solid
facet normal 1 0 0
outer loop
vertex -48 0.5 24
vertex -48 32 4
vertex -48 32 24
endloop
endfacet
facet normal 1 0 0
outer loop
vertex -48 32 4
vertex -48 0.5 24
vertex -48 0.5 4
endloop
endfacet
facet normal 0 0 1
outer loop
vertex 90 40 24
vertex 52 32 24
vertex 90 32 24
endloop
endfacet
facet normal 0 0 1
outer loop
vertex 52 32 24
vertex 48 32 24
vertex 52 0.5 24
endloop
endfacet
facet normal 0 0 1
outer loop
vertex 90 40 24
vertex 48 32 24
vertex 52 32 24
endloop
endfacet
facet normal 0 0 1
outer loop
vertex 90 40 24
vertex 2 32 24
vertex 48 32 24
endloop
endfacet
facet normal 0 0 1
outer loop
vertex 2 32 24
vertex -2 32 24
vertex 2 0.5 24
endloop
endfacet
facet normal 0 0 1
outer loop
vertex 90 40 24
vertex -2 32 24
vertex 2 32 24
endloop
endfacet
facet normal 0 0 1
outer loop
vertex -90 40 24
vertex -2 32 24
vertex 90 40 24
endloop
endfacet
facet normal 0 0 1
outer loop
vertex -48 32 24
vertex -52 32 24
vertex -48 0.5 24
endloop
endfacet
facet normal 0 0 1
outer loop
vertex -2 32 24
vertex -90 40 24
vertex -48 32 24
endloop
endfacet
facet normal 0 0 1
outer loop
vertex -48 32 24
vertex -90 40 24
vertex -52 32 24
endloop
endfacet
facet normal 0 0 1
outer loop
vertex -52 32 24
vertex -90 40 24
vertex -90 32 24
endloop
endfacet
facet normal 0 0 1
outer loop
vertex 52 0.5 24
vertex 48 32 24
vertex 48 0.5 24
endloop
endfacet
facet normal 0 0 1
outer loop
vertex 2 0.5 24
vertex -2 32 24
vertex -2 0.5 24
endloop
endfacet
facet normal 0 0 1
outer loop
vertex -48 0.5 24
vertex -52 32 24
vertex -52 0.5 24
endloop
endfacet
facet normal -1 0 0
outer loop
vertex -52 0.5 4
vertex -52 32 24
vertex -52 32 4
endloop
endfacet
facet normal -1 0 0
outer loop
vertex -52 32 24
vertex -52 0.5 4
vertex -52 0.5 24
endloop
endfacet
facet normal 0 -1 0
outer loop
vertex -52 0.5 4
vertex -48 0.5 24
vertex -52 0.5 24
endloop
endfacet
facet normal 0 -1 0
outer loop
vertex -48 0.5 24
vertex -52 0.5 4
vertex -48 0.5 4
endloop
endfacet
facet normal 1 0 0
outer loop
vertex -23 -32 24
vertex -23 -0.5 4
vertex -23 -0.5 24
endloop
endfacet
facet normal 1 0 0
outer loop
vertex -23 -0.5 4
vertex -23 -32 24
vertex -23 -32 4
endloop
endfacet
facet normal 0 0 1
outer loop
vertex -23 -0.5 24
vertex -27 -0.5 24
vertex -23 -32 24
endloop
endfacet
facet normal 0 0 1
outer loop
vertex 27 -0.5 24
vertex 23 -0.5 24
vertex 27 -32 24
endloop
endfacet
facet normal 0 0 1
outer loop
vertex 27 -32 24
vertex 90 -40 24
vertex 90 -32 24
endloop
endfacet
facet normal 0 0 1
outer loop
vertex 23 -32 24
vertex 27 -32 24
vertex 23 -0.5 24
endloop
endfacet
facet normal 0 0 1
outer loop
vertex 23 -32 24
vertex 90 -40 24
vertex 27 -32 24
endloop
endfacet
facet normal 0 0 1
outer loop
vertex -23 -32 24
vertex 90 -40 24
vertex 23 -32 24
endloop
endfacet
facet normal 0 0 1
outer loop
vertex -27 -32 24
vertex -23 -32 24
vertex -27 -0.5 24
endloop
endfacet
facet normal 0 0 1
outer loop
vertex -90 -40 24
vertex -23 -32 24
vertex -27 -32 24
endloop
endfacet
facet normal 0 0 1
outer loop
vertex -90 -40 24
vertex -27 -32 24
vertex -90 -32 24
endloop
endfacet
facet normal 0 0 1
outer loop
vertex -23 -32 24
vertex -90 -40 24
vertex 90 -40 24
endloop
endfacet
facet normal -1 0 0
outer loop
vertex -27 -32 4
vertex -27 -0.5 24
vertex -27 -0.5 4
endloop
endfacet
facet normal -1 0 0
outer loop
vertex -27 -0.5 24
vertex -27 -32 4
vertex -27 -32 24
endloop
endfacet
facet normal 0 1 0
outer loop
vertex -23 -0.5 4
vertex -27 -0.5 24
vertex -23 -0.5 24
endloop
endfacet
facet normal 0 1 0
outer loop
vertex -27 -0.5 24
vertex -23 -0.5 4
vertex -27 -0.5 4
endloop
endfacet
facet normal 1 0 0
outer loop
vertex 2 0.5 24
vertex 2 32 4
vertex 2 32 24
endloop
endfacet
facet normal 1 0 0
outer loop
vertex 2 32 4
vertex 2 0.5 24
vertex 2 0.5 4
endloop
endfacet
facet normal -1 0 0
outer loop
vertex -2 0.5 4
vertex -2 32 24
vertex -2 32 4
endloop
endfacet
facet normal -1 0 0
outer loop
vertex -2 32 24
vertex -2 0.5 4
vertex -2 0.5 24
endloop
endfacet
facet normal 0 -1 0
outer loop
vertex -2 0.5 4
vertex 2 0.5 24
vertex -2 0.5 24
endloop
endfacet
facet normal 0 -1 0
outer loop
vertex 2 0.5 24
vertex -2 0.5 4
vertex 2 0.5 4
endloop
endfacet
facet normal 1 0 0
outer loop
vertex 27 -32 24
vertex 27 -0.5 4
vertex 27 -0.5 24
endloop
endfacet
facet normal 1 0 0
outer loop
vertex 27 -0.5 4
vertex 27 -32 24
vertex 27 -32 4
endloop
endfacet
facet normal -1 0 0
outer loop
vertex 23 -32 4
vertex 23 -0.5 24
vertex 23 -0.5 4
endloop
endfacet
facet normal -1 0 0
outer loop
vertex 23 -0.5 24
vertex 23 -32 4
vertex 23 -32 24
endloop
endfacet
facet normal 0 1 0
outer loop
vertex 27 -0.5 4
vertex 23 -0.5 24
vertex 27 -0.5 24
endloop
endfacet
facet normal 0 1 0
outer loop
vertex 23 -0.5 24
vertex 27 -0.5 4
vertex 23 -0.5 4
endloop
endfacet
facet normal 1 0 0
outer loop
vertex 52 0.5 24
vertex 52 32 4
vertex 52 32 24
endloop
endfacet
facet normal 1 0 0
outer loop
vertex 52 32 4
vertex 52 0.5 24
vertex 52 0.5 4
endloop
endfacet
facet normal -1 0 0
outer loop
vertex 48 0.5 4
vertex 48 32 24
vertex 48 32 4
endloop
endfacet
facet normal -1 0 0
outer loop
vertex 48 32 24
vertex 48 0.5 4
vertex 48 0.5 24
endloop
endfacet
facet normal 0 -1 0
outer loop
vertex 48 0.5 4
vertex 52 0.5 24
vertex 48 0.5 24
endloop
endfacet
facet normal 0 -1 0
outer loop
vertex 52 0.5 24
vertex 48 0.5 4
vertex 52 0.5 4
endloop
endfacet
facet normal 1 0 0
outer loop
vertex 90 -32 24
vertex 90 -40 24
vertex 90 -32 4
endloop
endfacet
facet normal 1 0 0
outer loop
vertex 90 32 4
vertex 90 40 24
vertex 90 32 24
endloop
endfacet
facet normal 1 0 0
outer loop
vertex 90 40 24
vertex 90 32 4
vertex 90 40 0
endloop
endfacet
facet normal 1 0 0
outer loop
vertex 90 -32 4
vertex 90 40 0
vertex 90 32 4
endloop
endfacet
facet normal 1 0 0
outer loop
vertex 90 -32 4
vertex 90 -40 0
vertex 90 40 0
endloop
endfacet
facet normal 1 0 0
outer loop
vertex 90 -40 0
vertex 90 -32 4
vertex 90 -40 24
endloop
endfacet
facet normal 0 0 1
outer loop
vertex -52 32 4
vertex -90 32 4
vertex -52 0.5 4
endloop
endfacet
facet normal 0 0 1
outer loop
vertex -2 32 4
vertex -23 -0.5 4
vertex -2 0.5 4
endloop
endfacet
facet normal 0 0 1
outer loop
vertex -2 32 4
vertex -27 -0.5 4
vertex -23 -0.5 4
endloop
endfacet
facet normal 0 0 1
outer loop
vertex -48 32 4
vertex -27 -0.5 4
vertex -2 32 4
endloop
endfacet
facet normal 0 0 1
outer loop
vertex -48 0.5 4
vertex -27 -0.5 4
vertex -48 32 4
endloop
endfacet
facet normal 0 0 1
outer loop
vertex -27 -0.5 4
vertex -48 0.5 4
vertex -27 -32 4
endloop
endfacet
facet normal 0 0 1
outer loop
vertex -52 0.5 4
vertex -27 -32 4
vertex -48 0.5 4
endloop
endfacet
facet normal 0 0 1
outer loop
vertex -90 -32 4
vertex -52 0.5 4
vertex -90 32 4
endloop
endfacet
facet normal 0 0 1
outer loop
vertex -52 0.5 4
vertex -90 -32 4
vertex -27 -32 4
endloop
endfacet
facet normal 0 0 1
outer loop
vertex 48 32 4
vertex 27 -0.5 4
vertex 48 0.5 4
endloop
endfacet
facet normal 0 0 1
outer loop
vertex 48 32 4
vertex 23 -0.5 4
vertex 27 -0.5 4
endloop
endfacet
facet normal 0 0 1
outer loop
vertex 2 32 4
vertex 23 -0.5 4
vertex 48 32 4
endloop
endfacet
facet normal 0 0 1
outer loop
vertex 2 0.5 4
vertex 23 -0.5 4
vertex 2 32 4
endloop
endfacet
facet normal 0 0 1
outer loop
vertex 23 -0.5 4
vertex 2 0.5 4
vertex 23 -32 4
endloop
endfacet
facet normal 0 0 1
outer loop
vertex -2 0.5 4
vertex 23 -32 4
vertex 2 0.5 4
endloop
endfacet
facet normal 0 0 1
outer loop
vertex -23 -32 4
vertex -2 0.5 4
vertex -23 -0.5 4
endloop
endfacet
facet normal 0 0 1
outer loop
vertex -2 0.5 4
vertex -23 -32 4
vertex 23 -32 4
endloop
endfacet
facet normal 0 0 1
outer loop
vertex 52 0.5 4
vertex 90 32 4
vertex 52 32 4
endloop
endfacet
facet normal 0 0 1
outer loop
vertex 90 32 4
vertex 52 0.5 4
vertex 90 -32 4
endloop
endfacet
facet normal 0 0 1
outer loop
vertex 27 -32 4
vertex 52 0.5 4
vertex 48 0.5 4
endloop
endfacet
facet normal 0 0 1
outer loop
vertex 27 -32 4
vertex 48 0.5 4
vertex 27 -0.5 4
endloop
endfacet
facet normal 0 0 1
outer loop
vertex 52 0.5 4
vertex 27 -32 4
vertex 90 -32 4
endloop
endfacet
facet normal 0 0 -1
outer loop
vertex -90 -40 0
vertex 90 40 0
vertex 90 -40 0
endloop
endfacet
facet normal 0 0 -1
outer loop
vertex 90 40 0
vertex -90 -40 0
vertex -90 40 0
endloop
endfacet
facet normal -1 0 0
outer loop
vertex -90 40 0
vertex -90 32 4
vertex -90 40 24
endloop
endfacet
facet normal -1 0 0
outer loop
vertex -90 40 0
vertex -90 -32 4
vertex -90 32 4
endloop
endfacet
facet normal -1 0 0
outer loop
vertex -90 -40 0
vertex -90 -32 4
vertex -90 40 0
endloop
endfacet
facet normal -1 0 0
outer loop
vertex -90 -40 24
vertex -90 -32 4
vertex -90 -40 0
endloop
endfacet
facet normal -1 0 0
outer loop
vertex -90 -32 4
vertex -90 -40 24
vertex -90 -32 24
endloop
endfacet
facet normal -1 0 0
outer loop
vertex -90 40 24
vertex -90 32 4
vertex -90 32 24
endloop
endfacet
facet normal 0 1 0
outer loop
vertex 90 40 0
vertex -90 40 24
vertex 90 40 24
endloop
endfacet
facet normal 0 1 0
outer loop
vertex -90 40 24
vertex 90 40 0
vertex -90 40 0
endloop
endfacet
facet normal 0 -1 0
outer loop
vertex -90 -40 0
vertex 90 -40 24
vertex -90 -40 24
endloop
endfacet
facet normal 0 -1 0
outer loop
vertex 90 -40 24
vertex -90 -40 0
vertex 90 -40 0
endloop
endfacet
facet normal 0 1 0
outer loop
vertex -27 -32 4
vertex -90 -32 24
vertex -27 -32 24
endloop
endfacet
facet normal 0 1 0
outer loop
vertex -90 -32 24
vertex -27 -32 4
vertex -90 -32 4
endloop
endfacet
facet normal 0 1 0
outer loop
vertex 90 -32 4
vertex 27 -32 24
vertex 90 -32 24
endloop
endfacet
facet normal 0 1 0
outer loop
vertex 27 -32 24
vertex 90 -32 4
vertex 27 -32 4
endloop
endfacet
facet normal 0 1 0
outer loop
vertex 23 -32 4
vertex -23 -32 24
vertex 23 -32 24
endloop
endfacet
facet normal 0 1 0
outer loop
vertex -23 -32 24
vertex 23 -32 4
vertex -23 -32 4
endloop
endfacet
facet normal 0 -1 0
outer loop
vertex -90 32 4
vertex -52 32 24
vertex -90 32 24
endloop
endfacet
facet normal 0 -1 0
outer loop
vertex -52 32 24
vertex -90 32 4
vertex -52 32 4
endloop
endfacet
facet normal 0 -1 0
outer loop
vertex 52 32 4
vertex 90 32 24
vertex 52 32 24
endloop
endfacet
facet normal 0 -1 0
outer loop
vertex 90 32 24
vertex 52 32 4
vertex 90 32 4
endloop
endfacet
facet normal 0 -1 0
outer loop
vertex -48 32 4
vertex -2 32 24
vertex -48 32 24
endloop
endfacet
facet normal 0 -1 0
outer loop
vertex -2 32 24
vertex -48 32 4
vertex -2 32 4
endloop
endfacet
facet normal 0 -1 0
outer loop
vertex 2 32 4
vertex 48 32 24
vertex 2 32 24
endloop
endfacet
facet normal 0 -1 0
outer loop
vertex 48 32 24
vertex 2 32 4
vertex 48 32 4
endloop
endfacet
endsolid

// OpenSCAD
$fn = 32;

// ----------------------------------------------------------------------
// Rib frame 180 x 80 x 24
// 5 ribs at 25 mm pitch, staggered
// ----------------------------------------------------------------------

// --- parameters (mm) ---
frame = [180, 80, 4];  // base plate size (x, y, z)
rail_w = 8;            // side rail width
ribs = 5;              // number of ribs
rib_t = 4;             // rib thickness
rib_h = 20;            // rib height above the base plate
pitch = 25;            // pitch between rib centres

// --- derived feature positions (mm) ---
span = (ribs - 1) * pitch;          // = 100   distance between the outer ribs
origin_x = -span / 2;               // = -50   X of the first rib
rib_len = frame[1] / 2 - rail_w + 0.5;  // = 32.5   length of a staggered rib
rib_y = 0.5 + rib_len / 2;          // = 16.75   Y of a staggered rib centre
row_offset = 2 * rib_y;             // = 33.5   distance between the two rows
feature_centers = [
  [origin_x + 0 * pitch, rib_y],
  [origin_x + 1 * pitch, -rib_y],
  [origin_x + 2 * pitch, rib_y],
  [origin_x + 3 * pitch, -rib_y],
  [origin_x + 4 * pitch, rib_y]
];   // rib centre line, drives the rib loop

// base plate, two side rails, then the ribs read straight off feature_centers
union() {
  translate([-frame[0] / 2, -frame[1] / 2, 0]) cube(frame);
  translate([-frame[0] / 2, -frame[1] / 2, 0]) cube([frame[0], rail_w, frame[2] + rib_h]);
  translate([-frame[0] / 2, frame[1] / 2 - rail_w, 0]) cube([frame[0], rail_w, frame[2] + rib_h]);
  for (centre = feature_centers)
    translate([centre[0] - rib_t / 2, centre[1] - rib_len / 2, frame[2] - 1])
      cube([rib_t, rib_len, rib_h + 1]);
}
